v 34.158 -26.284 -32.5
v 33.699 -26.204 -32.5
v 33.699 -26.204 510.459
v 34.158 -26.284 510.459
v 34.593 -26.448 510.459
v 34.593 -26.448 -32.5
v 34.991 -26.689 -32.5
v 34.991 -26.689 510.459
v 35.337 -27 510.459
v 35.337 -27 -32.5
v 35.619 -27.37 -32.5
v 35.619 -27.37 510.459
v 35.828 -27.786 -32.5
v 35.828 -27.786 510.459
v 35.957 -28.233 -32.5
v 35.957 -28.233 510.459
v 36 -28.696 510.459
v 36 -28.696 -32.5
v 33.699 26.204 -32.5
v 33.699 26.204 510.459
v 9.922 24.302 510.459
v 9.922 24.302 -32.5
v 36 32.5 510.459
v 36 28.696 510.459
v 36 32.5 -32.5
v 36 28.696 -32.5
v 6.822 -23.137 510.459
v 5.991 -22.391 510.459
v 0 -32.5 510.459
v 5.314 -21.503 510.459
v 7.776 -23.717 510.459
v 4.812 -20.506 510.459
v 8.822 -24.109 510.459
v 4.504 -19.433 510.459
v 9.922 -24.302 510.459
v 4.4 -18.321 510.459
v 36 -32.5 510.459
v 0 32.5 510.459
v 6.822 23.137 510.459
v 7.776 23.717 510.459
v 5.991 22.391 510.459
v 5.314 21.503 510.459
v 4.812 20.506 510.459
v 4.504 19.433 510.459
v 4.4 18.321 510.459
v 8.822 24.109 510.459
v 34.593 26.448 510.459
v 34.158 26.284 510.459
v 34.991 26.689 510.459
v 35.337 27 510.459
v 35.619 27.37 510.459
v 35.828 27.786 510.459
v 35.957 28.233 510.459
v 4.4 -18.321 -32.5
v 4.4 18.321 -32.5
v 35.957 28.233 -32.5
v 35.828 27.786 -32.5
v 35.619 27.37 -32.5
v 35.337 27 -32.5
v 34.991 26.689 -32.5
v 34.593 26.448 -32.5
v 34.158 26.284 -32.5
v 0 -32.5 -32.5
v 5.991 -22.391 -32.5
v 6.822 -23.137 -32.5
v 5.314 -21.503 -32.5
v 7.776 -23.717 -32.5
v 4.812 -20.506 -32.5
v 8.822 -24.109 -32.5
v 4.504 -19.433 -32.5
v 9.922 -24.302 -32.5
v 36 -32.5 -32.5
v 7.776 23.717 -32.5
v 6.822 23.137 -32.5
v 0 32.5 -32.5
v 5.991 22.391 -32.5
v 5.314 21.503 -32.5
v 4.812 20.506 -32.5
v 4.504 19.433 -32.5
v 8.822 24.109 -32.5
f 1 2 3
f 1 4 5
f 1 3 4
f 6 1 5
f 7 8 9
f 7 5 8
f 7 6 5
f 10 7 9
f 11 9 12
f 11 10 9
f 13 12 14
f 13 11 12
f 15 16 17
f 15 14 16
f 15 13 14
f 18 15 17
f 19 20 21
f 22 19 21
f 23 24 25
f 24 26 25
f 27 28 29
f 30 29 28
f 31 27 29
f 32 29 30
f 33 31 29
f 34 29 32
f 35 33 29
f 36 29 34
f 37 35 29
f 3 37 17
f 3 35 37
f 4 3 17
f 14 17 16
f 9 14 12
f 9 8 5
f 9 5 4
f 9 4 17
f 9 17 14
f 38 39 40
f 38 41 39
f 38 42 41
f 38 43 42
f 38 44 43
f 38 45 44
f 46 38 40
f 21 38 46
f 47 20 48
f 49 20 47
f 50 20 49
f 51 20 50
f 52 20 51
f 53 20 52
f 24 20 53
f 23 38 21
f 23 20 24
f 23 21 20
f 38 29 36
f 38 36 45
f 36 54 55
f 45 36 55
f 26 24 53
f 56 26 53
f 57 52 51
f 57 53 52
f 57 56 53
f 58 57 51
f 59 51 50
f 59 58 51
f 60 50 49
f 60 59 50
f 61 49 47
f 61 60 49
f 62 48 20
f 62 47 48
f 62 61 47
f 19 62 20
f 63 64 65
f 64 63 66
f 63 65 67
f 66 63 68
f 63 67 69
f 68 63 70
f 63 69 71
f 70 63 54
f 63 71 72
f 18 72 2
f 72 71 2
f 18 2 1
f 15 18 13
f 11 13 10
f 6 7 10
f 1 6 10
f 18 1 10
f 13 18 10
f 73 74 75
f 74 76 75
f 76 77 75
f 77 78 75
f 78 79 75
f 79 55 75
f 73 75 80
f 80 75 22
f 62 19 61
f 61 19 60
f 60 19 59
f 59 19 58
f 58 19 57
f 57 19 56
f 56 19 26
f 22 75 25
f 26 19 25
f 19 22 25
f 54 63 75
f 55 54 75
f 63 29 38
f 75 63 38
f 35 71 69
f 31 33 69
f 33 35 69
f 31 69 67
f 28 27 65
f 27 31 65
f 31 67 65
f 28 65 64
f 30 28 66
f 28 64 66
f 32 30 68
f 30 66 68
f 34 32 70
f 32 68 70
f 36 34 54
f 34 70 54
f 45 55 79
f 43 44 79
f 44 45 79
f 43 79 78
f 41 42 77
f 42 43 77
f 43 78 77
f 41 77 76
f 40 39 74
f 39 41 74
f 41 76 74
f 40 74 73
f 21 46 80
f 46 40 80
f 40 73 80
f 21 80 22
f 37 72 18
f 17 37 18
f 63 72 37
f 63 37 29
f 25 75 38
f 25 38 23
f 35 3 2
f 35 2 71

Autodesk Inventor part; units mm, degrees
ref_plane "Начальная плоскость" through (0, 0, -32.5) normal (0, 0, 1) x (1, 0, 0)
ref_plane "Конечная плоскость" through (0, 0, 510.459) normal (0, 0, 1) x (1, 0, 0)
sketch "Эскиз" plane through (0, 0, 0) normal (0, 0, 1) x (1, 0, 0)
  line L0 (36, -32.5) -> (0, -32.5)
  line L1 (36, -32.5) -> (36, -28.696)
  line L2 (33.6994, -26.2039) -> (9.9215, -24.3017)
  line L3 (4.4, -18.3208) -> (4.4, 18.3208)
  line L4 (33.6994, 26.2039) -> (9.9215, 24.3017)
  line L5 (36, 28.696) -> (36, 32.5)
  line L6 (0, 32.5) -> (36, 32.5)
  line L7 (0, -32.5) -> (0, 32.5)
  arc A0 (4.4, -18.3208) -> (9.9215, -24.3017) centre (10.4, -18.3208) ccw
  arc A1 (9.9215, 24.3017) -> (4.4, 18.3208) centre (10.4, 18.3208) ccw
  arc A2 (36, -28.696) -> (33.6994, -26.2039) centre (33.5, -28.696) ccw
  arc A3 (33.6994, 26.2039) -> (36, 28.696) centre (33.5, 28.696) ccw
  line L8 (0, 45.5) -> (0, -45.5) construction
  line L9 (-7.2974, 0) -> (43.7847, 0) construction
  point P0 (36, -26.388)
  point P1 (4.4, -23.86)
  point P2 (4.4, 23.86)
  point P3 (36, 26.388)
  dimension "d3" = 36
  dimension "d5" = 4.4
  dimension "d7" = 65
  dimension "d9" = 8.64
  dimension "d11" = 8.64
  dimension "d13" = 6.112
  dimension "d15" = 6.112
  dimension "d22" = 6
  dimension "d23" = 2.5
  dimension "d24" = 32.5
  dimension "d25" = 0
extrude "Тело" add sketch "Эскиз" along normal up to surface (542.959 mm away) from surface at -32.5
sketch "Sketch3" plane through (0, 0, 0) normal (0, 0, 1) x (1, 0, 0)
  line L0 (0, 0) -> (10, 0)
ref_plane "Work Plane7" through (0, 0, 0) normal (0, -1, 0) x (1, 0, 0)
sketch "Sketch4" plane through (0, 0, 0) normal (0, -1, 0) x (1, 0, 0)
  line L0 (-2, -32.5) -> (12, -32.5)
  line L1 (-2, 510.459) -> (12, 510.459)
  dimension "d29" = 542.959
ref_plane "РабПлоскость8" through (0, 0, 510.459) normal (0, 0, 1) x (1, 0, 0)
split "Разделение1" plane through (0, 0, 510.459) removes the side toward (0, 0, 1)
ref_plane "РабПлоскость9" through (18, 177.5, -32.5) normal (0, 0, -1) x (-1, 0, 0)
split "Разделение2" plane through (18, 177.5, -32.5) removes the side toward (0, 0, -1)
equation "\"d3\" = b"
equation "\"d5\" = t1"
equation "\"d7\" = ParH"
equation "\"d9\" = msp_x1 + t2"
equation "\"d11\" = msp_x1 + t2"
equation "\"d13\" = -msp_x2 + t2"
equation "\"d15\" = -msp_x2 + t2"
equation "\"d22\" = R"
equation "\"d23\" = R1"
equation "\"d24\" = 0.5 * d7"
equation "\"d16\" = G_L"
equation "\"R1\" = 2.5"
equation "\"R\" = 6"
equation "\"t1\" = 4.4"
equation "\"t2\" = 7.2"
equation "\"ParH\" = 65"
equation "\"b\" = 36"
equation "\"msp_x1\" = 0.04 * b"
equation "\"msp_x2\" = -0.08 * t1 + 0.04 * b"
equation "\"G_L\" = d29"
equation "\"ex\" = 0"
equation "\"G_OFFSET_START\" = 32.5"
equation "\"G_OFFSET_END\" = -36"
equation "\"d26\" = -G_OFFSET_START"
equation "\"d27\" = G_OFFSET_END + B_L"
equation "\"B_L\" = 546.459"
properties part number "Швеллер 6.5U-542,96 ГОСТ 8240-97"
